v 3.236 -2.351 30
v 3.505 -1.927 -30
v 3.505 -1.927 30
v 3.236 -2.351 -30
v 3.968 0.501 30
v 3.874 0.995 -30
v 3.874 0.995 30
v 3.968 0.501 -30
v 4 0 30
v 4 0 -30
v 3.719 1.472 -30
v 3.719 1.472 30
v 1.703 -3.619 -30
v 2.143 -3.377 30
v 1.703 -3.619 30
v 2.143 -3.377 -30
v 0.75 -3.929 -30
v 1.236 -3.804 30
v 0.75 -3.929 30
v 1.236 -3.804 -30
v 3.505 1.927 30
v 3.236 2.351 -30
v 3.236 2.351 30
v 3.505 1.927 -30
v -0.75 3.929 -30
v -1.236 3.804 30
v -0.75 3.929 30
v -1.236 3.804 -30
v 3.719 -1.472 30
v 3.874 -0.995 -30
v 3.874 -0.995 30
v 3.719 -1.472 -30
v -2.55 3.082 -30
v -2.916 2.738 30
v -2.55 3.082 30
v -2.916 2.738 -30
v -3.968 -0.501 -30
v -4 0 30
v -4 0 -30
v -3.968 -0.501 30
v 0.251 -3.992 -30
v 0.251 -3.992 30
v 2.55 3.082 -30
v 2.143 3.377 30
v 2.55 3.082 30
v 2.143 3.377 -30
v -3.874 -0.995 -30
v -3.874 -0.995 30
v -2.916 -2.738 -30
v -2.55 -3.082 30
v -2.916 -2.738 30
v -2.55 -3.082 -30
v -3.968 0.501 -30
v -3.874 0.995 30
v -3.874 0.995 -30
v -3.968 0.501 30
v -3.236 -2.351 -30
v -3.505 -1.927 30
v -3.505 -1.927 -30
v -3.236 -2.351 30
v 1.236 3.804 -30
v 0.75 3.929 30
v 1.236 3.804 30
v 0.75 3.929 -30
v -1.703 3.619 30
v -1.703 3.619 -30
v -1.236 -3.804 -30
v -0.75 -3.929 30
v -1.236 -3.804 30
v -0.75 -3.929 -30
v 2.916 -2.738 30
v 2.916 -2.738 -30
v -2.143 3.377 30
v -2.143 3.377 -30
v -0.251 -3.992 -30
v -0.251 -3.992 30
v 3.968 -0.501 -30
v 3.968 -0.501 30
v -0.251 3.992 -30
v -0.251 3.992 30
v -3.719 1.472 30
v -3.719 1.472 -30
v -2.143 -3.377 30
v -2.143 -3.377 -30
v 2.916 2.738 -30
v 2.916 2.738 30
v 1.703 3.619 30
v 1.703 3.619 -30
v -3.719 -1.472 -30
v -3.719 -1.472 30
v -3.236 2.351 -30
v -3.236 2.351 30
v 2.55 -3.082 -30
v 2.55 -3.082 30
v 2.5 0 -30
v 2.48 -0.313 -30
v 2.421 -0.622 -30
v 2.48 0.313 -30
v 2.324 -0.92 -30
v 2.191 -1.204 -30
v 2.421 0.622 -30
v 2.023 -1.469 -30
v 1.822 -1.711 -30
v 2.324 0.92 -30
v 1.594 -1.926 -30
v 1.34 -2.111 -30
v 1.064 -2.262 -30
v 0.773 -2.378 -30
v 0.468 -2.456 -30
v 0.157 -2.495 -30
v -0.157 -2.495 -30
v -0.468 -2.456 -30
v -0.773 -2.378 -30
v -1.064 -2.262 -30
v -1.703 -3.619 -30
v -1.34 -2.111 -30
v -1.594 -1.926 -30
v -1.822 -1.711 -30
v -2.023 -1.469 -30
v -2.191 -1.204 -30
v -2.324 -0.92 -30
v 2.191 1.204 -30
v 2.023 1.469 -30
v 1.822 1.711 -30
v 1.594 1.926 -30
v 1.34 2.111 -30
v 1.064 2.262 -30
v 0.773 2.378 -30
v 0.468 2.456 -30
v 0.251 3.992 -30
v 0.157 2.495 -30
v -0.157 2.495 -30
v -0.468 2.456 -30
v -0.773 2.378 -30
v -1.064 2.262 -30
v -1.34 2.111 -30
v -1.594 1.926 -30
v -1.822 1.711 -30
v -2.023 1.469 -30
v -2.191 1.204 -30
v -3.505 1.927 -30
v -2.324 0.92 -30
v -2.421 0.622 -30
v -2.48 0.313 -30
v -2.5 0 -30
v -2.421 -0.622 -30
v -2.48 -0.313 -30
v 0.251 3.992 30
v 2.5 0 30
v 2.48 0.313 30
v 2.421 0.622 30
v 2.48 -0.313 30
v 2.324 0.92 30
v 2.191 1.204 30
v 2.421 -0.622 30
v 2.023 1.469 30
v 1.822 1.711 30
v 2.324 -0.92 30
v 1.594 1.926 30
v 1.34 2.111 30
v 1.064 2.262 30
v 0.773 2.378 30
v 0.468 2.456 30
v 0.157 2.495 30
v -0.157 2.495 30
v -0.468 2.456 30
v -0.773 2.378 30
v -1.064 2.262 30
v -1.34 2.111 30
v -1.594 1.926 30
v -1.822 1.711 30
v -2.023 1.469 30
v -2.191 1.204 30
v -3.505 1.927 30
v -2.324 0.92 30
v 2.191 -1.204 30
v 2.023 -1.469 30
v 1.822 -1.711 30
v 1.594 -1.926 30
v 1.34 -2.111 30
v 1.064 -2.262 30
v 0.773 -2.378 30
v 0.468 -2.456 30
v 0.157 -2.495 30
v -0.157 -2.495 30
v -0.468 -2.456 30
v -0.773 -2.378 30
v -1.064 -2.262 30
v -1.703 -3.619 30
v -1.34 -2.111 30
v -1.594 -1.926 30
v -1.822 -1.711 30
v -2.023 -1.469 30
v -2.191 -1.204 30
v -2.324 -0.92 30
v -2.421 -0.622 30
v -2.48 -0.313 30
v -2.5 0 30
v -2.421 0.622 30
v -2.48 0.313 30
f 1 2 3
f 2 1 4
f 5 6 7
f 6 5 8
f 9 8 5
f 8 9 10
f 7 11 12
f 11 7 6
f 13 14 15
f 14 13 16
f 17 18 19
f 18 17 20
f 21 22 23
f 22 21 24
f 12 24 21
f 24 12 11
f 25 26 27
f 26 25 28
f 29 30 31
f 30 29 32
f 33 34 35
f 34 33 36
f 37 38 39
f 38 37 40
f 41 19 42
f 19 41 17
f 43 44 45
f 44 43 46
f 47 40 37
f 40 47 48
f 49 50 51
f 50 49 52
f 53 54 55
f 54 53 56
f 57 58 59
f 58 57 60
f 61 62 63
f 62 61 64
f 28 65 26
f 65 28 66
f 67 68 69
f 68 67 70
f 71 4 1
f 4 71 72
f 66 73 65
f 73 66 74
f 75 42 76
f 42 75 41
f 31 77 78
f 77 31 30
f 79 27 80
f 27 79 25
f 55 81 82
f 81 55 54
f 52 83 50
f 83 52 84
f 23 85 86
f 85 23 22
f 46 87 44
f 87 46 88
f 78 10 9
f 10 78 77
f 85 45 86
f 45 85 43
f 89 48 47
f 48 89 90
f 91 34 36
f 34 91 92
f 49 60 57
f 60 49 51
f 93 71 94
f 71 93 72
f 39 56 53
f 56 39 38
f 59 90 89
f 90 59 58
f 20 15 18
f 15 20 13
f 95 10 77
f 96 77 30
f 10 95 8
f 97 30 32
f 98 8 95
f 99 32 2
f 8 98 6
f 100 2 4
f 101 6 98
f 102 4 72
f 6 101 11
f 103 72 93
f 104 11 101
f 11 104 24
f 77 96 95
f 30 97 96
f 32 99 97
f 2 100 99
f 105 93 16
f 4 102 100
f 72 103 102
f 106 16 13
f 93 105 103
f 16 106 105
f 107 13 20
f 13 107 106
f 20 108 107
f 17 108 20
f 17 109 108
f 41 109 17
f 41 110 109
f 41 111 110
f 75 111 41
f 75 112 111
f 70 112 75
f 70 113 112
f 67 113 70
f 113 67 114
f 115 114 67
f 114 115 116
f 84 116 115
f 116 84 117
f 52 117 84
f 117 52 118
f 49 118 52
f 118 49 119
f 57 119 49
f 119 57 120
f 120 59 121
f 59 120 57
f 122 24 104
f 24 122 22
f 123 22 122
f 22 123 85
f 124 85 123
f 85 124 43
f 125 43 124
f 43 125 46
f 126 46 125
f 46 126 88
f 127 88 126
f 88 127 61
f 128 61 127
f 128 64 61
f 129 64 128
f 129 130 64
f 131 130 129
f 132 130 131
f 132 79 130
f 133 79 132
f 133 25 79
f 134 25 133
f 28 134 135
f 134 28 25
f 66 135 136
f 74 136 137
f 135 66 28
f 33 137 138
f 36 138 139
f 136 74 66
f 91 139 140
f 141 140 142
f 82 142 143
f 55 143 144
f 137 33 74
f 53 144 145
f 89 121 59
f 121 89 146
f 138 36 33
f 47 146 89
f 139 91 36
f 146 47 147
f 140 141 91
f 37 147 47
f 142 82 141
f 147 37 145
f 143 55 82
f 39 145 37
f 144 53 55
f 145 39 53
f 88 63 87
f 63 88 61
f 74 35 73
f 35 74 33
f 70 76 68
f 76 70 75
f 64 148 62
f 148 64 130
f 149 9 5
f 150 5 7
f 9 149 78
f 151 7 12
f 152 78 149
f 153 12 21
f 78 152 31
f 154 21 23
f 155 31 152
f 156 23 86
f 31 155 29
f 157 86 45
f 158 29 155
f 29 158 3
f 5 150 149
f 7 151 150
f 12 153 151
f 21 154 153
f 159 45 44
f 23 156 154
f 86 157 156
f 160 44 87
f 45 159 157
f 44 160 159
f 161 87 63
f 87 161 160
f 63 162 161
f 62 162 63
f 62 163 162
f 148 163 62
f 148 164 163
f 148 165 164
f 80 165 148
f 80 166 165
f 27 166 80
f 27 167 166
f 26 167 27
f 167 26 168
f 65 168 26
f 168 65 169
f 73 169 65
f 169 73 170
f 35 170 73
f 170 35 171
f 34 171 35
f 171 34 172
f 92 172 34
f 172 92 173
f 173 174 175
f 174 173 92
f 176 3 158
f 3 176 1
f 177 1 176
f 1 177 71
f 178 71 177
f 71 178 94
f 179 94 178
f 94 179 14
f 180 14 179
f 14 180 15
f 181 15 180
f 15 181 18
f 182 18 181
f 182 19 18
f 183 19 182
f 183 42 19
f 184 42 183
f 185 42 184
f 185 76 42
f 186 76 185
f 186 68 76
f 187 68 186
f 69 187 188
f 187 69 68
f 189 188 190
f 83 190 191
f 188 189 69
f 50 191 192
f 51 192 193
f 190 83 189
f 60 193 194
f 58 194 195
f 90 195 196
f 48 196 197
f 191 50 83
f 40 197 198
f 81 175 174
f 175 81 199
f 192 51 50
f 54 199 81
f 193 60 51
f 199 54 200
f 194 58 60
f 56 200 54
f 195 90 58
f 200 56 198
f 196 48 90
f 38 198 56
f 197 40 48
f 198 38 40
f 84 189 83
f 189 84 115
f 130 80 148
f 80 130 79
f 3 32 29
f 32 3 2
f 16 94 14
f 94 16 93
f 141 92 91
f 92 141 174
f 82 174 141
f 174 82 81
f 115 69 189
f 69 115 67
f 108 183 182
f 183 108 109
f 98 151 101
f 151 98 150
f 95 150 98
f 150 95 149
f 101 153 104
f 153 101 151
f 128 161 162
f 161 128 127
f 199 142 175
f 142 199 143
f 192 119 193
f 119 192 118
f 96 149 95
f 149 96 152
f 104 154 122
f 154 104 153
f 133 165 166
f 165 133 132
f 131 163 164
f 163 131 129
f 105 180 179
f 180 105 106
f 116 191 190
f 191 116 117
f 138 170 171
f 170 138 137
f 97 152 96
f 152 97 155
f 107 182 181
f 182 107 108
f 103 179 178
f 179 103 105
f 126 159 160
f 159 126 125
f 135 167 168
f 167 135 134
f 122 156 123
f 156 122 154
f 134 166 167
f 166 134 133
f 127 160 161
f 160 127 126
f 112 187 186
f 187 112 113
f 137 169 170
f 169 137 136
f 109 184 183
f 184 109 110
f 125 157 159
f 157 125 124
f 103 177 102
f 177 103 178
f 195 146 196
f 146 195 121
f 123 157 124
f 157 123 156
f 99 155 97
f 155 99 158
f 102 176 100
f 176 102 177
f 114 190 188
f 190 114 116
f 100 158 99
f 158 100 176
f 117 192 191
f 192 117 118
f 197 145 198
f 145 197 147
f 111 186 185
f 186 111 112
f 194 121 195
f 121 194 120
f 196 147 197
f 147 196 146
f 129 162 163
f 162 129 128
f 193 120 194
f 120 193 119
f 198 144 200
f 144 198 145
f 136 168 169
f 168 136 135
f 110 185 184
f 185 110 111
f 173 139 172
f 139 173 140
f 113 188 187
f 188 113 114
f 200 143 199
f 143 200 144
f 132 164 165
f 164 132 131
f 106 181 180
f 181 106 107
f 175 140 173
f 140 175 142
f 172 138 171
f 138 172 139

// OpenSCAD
$fn = 50;


difference() {
	union() {
		translate(v = [0, 0, -30.0000000000]) {
			cylinder(h = 60, r = 4.0000000000);
		}
	}
	union() {
		translate(v = [0, 0, -100.0000000000]) {
			cylinder(h = 200, r = 2.5000000000);
		}
	}
}
